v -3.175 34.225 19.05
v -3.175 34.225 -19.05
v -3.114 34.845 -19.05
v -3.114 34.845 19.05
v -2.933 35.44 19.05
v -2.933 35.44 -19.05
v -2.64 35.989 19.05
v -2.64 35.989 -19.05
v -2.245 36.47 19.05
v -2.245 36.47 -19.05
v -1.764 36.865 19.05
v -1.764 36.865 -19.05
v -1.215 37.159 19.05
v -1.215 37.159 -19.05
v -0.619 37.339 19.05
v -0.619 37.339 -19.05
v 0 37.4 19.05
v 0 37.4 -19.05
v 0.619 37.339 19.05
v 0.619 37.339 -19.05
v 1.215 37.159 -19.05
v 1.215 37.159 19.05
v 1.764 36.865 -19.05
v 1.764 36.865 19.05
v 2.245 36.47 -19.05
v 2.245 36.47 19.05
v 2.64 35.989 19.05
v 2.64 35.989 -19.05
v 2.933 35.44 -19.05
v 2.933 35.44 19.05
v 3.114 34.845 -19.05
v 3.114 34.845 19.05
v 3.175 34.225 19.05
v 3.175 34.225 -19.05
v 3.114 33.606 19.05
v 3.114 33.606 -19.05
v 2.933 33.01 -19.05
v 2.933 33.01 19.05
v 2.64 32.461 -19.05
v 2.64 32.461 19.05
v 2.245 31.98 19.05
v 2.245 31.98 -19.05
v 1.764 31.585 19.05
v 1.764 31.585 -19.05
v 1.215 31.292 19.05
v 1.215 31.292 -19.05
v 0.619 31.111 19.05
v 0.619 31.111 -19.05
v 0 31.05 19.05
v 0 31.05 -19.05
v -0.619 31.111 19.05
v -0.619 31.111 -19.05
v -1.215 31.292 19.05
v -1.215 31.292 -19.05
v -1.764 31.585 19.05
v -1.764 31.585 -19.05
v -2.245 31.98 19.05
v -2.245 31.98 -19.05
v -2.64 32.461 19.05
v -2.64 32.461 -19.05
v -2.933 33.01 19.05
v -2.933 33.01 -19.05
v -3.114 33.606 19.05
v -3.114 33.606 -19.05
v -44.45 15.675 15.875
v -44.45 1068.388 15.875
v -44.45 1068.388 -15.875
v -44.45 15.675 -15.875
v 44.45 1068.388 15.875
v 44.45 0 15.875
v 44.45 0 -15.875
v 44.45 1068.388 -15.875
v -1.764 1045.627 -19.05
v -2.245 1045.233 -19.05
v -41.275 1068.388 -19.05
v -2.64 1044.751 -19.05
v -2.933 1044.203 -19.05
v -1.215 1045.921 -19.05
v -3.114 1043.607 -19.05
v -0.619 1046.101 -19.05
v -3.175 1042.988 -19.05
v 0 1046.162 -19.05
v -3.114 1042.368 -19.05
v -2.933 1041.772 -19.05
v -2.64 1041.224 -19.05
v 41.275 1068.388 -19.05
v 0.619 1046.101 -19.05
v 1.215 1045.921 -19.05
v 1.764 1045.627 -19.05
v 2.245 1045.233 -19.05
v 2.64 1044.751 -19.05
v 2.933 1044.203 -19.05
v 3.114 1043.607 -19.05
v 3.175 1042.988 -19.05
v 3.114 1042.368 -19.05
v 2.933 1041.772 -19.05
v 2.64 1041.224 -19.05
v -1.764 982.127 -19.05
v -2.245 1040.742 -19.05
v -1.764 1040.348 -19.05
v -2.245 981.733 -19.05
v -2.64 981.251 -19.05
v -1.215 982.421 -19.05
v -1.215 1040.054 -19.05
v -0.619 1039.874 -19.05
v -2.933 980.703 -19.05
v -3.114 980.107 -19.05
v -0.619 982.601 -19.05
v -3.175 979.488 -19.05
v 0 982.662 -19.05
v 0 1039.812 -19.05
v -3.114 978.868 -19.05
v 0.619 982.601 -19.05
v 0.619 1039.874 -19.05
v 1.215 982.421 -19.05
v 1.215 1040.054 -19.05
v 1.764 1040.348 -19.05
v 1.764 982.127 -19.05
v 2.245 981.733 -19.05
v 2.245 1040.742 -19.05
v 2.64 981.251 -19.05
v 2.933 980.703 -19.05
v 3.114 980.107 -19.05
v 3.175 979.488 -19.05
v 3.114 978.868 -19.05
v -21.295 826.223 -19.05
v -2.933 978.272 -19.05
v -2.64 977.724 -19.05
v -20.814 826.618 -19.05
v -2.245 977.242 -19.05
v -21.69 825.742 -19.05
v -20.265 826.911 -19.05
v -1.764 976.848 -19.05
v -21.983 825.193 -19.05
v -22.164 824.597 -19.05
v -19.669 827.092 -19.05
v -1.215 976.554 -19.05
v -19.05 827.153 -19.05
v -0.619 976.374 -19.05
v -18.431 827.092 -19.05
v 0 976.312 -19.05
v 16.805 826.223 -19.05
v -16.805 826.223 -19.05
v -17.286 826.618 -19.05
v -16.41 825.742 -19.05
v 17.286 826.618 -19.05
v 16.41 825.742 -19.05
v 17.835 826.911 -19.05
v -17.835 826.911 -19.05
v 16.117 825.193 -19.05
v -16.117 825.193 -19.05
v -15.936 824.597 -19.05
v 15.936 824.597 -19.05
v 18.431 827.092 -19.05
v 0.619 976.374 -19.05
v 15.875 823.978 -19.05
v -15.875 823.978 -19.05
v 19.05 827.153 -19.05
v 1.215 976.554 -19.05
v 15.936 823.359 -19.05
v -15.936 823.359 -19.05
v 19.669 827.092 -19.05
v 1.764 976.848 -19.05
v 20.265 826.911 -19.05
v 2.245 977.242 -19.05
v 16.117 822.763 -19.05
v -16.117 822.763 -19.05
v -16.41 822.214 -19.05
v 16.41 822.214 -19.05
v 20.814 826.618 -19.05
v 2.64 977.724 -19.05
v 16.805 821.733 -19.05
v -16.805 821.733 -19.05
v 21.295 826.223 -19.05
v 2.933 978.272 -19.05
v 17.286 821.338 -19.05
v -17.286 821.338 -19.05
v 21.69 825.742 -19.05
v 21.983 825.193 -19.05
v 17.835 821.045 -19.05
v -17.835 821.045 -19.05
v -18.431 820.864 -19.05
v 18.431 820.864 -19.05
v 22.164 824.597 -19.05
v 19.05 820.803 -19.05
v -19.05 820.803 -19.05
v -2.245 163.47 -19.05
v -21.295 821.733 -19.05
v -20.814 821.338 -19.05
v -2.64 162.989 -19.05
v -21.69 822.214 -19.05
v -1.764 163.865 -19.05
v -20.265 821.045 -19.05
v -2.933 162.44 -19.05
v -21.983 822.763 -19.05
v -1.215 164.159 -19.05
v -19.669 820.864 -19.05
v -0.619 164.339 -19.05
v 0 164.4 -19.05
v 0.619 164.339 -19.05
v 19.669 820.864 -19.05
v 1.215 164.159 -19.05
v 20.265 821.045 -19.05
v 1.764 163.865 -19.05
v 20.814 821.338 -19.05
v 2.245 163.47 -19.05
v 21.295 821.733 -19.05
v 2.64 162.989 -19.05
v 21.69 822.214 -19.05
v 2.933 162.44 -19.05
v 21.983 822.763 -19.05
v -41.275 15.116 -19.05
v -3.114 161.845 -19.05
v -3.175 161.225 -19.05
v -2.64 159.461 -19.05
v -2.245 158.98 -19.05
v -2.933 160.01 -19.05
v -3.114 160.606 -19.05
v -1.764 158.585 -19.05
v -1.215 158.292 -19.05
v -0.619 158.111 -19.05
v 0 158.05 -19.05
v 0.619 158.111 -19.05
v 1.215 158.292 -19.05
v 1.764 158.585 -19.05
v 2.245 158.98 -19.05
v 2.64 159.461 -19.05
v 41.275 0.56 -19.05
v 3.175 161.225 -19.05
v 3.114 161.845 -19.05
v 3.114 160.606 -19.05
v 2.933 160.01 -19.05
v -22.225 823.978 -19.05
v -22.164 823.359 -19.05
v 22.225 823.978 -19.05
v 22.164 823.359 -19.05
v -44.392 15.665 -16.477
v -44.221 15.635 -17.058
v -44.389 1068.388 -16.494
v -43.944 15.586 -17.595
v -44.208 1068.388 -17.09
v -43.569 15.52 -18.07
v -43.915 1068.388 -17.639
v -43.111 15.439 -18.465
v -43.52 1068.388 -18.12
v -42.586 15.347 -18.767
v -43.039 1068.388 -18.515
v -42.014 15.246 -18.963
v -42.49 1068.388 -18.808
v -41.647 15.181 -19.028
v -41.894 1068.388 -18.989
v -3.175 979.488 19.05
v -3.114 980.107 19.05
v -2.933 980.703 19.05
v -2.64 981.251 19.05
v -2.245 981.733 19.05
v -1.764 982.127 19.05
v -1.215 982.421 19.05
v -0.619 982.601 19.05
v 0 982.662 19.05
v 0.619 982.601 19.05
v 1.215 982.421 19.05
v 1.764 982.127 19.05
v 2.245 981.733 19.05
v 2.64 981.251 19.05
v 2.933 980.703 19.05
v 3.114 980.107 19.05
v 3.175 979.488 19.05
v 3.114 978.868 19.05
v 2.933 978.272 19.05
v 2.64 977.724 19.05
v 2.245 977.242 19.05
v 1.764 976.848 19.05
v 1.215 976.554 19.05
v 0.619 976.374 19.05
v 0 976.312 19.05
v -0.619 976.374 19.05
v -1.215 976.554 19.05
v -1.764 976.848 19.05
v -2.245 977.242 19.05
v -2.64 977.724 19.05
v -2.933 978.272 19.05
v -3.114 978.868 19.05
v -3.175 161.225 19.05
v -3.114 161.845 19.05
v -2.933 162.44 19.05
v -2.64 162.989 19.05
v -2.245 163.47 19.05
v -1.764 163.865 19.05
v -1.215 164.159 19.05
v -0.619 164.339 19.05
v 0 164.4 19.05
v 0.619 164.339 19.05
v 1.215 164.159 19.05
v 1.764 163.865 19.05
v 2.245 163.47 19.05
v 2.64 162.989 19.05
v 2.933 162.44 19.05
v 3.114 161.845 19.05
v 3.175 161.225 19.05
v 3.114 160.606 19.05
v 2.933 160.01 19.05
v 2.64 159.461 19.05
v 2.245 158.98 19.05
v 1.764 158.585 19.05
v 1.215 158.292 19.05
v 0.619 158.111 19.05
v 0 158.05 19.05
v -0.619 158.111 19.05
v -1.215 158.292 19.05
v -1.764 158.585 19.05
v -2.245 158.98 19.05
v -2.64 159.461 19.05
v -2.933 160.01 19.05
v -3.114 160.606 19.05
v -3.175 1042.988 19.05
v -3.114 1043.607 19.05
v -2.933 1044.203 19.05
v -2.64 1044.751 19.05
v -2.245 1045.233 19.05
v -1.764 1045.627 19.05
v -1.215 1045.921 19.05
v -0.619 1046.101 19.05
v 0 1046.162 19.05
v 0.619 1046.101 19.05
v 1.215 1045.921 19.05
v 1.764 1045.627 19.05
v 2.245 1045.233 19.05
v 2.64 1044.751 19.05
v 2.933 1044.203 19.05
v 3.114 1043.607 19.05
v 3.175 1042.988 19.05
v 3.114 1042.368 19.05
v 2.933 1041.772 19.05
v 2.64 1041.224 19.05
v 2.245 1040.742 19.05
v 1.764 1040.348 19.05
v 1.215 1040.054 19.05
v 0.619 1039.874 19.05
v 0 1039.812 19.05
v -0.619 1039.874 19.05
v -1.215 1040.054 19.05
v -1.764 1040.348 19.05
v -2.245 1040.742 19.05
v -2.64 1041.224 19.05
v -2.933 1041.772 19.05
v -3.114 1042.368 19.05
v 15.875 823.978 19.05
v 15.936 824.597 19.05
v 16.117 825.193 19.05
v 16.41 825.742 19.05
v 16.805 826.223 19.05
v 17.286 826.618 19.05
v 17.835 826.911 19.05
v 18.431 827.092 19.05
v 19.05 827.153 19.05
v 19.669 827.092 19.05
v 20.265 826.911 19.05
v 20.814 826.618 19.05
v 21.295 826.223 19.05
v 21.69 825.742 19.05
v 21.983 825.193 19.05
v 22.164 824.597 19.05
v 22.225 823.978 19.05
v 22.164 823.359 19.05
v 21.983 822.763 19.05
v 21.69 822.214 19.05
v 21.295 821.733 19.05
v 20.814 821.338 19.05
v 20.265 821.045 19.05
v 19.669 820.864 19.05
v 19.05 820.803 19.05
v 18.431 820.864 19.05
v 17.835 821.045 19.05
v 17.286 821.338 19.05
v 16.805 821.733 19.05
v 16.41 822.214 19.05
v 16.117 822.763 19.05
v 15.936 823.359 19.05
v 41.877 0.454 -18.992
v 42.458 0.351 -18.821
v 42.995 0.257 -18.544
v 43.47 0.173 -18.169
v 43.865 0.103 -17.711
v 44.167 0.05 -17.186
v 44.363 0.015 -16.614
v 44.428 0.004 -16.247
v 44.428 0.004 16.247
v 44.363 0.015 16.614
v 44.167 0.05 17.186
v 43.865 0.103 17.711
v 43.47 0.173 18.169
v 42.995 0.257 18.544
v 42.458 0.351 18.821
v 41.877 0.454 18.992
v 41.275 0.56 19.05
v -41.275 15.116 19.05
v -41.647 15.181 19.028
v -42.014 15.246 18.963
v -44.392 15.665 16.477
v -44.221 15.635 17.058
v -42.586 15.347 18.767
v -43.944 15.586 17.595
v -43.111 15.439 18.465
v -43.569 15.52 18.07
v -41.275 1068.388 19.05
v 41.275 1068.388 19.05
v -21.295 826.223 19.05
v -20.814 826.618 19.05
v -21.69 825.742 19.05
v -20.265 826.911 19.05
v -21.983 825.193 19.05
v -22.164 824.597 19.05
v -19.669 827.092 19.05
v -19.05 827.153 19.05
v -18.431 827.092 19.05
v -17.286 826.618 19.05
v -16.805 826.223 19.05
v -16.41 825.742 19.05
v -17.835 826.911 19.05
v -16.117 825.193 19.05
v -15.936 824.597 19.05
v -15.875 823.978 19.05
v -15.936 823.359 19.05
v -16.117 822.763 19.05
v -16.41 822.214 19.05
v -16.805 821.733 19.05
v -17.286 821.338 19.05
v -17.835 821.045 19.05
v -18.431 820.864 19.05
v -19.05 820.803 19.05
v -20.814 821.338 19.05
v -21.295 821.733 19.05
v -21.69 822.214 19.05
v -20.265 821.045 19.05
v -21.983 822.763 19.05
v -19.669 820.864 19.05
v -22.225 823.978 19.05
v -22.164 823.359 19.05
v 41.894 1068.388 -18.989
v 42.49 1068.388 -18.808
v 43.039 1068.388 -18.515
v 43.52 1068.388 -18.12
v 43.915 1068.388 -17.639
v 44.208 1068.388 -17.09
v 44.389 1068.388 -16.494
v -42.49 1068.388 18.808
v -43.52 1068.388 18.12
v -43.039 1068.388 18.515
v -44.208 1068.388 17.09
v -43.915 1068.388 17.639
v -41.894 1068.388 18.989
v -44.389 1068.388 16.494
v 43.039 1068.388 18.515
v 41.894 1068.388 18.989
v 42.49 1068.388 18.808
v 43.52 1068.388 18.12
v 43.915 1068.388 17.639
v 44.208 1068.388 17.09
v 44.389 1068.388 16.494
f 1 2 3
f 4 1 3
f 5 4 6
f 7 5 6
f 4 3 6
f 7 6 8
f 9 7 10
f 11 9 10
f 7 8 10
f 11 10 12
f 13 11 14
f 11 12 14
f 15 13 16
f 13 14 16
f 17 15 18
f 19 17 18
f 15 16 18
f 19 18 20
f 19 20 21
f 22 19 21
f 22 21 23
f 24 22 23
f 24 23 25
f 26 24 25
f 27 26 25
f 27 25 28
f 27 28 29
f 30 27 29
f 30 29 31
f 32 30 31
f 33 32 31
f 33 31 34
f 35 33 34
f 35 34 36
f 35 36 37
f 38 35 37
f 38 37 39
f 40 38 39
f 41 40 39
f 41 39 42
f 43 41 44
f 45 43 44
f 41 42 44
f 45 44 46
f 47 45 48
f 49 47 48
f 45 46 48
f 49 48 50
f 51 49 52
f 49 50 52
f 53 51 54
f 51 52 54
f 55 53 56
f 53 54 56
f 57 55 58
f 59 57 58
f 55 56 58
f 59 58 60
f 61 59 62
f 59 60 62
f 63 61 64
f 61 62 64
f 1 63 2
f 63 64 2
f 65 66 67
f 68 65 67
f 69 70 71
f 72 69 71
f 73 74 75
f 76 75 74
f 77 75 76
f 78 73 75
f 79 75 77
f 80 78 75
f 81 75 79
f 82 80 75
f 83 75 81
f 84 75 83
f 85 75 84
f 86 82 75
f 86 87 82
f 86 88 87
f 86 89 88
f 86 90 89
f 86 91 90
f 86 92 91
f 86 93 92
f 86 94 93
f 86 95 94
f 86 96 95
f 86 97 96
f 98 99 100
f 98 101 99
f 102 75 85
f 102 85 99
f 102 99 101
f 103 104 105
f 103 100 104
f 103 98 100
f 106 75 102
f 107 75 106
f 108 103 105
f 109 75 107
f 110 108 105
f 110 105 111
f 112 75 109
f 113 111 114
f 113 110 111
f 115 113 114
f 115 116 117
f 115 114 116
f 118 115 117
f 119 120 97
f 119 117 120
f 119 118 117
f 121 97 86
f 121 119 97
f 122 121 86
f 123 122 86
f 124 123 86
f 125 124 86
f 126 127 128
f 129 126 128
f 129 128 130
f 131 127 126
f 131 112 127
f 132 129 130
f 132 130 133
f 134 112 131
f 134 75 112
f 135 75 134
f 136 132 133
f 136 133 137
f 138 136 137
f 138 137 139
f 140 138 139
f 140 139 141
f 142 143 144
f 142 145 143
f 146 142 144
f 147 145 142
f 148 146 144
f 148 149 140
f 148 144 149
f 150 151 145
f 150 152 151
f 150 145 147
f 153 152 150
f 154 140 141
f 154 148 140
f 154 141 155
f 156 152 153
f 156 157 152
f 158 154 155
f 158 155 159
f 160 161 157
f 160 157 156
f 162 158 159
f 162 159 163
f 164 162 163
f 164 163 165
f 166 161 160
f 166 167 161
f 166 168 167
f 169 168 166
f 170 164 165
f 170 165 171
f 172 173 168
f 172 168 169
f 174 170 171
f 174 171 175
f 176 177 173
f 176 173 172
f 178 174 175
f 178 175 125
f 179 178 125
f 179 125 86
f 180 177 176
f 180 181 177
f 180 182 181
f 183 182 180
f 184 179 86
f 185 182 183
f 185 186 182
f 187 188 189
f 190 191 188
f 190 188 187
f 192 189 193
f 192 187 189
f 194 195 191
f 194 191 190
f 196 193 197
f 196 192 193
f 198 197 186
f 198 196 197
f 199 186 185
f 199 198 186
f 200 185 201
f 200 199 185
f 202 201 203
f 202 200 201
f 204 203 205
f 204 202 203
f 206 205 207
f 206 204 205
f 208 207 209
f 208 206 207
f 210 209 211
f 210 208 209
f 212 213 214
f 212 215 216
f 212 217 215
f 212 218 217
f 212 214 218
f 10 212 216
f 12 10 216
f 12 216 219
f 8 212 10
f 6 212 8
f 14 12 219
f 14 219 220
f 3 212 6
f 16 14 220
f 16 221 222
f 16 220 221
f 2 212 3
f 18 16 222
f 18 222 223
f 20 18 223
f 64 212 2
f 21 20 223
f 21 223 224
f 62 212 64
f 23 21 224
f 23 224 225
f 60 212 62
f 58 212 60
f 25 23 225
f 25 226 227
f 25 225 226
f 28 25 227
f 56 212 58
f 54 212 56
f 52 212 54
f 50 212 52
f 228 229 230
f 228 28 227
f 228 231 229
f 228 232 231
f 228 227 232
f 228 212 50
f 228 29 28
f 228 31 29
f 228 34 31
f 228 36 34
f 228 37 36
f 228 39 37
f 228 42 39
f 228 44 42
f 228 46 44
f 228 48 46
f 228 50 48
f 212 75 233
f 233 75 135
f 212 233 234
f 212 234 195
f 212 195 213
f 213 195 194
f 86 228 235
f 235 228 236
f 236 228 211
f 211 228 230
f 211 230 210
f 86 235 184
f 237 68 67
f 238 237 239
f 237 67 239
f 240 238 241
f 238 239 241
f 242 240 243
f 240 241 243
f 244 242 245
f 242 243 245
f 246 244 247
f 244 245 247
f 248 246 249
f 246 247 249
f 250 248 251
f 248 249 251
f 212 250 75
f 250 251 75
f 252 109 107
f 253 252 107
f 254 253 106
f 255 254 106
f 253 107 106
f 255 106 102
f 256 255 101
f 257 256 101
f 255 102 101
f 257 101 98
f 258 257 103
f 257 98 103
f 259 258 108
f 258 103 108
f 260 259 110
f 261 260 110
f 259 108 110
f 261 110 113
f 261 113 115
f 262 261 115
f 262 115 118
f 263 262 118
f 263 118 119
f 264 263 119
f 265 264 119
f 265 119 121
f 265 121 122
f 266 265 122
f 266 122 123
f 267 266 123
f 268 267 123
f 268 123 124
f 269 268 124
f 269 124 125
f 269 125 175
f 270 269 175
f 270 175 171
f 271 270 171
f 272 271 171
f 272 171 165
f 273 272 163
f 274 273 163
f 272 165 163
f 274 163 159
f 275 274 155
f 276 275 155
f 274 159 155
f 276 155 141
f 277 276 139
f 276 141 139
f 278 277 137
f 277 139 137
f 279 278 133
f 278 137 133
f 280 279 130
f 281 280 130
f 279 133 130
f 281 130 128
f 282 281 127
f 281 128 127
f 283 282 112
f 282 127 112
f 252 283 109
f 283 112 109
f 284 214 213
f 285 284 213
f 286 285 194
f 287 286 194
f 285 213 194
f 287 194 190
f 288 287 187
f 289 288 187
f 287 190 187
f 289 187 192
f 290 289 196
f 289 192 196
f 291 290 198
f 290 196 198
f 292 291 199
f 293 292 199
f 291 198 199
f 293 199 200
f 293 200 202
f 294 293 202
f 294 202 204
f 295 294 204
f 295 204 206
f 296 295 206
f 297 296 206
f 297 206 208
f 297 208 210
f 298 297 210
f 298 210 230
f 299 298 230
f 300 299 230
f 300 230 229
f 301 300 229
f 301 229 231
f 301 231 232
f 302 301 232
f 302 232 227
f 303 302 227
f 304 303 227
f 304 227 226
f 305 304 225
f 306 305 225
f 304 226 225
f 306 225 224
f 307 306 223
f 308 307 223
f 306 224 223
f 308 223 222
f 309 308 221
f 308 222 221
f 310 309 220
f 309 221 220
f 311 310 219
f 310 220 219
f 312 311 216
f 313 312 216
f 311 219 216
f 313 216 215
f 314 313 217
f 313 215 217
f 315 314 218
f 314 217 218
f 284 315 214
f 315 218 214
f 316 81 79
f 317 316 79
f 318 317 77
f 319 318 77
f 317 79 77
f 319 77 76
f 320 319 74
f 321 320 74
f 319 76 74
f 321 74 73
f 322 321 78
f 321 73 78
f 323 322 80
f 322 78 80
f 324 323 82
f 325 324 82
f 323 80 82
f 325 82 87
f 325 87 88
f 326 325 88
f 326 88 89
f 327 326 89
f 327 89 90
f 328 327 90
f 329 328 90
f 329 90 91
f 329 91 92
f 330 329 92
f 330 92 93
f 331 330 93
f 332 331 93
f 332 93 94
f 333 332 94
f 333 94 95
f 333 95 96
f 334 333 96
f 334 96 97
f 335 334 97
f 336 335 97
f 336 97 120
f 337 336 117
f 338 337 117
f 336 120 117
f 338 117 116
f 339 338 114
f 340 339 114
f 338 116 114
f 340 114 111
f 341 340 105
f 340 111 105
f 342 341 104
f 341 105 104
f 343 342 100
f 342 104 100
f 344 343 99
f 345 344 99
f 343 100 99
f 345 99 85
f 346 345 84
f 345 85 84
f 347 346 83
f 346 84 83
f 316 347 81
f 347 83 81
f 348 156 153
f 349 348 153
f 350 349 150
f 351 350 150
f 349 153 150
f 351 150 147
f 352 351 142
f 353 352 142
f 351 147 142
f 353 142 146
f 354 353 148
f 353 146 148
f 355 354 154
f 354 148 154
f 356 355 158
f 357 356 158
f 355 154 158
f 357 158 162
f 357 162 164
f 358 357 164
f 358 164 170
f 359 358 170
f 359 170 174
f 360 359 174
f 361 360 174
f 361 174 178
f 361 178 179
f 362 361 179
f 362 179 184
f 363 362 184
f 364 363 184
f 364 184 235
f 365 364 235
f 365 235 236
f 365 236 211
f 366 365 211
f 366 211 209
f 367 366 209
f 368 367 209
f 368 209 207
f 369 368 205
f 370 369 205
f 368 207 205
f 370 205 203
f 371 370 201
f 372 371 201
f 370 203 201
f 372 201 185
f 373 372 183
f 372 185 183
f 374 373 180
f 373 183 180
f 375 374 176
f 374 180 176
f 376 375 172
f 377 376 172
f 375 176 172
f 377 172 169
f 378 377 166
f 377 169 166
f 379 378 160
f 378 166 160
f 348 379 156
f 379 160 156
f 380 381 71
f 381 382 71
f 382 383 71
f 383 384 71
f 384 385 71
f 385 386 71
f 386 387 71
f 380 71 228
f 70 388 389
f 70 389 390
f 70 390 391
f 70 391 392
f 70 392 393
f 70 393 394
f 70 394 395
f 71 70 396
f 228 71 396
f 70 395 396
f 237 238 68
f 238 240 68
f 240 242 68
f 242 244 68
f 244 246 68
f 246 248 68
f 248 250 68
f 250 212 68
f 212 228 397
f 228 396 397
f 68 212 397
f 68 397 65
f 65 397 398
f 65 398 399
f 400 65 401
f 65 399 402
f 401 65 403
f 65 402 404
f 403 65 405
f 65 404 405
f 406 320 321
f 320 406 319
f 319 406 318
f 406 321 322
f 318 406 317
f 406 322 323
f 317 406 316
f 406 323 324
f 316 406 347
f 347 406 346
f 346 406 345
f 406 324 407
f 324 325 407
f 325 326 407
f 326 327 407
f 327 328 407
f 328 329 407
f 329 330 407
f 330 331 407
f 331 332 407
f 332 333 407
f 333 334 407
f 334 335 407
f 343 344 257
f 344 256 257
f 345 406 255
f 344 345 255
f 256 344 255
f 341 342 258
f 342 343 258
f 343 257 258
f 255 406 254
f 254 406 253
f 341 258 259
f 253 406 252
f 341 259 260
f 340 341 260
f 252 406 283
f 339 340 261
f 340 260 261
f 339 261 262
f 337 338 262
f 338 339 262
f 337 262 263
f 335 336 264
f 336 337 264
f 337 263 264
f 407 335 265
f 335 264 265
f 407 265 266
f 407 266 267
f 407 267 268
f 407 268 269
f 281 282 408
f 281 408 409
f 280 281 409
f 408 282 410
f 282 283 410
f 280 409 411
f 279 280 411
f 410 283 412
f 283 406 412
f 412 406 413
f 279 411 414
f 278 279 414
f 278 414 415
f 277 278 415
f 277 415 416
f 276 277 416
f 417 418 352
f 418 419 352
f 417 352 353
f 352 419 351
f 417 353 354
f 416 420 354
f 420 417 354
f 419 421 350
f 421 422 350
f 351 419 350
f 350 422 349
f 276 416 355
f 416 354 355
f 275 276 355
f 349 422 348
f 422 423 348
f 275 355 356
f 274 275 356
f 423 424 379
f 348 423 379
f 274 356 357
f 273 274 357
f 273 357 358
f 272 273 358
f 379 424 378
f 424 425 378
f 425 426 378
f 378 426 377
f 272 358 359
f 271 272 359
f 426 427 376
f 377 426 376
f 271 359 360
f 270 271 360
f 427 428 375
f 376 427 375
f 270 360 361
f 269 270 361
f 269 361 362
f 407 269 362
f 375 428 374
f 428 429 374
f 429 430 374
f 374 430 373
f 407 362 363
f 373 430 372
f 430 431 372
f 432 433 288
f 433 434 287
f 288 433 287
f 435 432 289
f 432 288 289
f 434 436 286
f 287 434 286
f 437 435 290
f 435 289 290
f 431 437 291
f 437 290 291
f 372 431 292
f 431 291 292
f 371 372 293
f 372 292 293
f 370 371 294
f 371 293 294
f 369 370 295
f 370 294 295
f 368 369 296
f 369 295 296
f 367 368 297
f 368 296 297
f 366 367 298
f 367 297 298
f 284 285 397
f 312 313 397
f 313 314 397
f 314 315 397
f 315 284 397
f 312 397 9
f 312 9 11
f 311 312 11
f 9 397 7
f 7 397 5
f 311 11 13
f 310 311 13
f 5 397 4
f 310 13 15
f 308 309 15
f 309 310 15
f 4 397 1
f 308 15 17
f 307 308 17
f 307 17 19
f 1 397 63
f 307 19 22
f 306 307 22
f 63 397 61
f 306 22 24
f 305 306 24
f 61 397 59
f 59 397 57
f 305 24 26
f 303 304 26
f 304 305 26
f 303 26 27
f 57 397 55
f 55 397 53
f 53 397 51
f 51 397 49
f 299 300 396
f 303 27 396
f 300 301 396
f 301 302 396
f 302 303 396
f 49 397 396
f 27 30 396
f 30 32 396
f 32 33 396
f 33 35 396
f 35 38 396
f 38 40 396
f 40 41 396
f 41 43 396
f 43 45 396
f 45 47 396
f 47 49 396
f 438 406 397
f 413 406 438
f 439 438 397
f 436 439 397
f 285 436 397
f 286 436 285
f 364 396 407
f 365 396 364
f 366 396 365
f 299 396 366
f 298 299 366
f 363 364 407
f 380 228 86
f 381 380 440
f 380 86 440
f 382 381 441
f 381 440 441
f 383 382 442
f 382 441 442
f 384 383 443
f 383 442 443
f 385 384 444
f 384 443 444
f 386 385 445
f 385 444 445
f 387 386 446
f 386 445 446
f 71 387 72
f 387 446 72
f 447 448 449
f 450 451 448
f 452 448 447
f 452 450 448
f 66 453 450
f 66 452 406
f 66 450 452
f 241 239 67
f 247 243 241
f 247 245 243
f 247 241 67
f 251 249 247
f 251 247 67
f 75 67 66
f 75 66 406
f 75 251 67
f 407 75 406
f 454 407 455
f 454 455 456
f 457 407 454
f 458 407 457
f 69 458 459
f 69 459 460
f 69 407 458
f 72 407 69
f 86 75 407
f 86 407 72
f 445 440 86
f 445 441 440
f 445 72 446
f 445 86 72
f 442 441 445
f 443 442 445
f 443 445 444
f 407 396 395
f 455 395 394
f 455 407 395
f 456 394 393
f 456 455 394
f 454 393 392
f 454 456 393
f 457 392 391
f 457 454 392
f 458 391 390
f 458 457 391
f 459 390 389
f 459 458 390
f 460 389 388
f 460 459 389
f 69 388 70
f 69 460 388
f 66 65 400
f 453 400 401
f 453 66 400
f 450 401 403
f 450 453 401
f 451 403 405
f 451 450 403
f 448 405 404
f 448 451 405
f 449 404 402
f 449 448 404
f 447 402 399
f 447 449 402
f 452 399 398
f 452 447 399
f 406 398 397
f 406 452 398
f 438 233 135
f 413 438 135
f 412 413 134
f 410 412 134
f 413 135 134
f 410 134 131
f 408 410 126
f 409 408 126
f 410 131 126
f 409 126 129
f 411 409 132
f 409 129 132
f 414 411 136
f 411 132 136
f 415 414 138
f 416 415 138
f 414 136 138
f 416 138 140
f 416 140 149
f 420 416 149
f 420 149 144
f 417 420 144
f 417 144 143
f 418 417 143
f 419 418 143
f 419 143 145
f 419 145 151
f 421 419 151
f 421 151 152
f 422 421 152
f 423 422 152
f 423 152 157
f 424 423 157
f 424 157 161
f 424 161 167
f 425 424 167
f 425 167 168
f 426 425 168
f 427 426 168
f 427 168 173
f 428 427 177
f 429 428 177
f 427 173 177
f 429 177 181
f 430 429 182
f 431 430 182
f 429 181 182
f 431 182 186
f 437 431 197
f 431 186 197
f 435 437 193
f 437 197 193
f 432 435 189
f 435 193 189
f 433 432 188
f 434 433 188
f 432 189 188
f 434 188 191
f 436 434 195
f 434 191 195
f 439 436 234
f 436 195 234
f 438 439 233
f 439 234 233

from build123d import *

# Parameters (mm, degrees)
SKETCH1_W                   = 88.9
SKETCH1_H                   = 38.1
BOSS_EXTRUDE1_DEPTH         = 1068.3875
CUT_EXTRUDE1_DEPTH          = 1257.6367532
F_1_4_0_25_DIAMETER_HOLE1_D = 6.35
FILLET1_R                   = 3.175


with BuildPart() as part:
    # Sketch1 → Boss-Extrude1 (new body)
    with BuildSketch(Plane(origin=(0, 0, 0), x_dir=(1, 0, 0), z_dir=(0, 1, 0))):
        Rectangle(SKETCH1_W, SKETCH1_H)
    extrude(amount=BOSS_EXTRUDE1_DEPTH)

    # Sketch2 → Cut-Extrude1 (cut)
    with BuildSketch(Plane.XY.offset(19.05)):
        Polygon((44.45, 0), (-44.45, 15.675468585), (-44.45, 0), align=None)
    extrude(amount=-CUT_EXTRUDE1_DEPTH, mode=Mode.SUBTRACT)

    # 1/4 (0.25) Diameter Hole1 (through all)
    with Locations(Plane.XY.offset(19.05)):
        with Locations((0, 34.225276482), (0, 161.225276482), (19.05, 823.9779812), (-19.05, 823.9779812), (0, 979.4875), (0, 1042.9875)):
            Hole(F_1_4_0_25_DIAMETER_HOLE1_D / 2)

    # Fillet1
    fillet1_edges = [part.edges().sort_by_distance(p)[0] for p in [
        (-44.45, 542.031484292, -19.05),
        (44.45, 534.19375, -19.05),
        (44.45, 534.19375, 19.05),
        (-44.45, 542.031484292, 19.05),
    ]]
    fillet(fillet1_edges, radius=FILLET1_R)


solid = part.part
